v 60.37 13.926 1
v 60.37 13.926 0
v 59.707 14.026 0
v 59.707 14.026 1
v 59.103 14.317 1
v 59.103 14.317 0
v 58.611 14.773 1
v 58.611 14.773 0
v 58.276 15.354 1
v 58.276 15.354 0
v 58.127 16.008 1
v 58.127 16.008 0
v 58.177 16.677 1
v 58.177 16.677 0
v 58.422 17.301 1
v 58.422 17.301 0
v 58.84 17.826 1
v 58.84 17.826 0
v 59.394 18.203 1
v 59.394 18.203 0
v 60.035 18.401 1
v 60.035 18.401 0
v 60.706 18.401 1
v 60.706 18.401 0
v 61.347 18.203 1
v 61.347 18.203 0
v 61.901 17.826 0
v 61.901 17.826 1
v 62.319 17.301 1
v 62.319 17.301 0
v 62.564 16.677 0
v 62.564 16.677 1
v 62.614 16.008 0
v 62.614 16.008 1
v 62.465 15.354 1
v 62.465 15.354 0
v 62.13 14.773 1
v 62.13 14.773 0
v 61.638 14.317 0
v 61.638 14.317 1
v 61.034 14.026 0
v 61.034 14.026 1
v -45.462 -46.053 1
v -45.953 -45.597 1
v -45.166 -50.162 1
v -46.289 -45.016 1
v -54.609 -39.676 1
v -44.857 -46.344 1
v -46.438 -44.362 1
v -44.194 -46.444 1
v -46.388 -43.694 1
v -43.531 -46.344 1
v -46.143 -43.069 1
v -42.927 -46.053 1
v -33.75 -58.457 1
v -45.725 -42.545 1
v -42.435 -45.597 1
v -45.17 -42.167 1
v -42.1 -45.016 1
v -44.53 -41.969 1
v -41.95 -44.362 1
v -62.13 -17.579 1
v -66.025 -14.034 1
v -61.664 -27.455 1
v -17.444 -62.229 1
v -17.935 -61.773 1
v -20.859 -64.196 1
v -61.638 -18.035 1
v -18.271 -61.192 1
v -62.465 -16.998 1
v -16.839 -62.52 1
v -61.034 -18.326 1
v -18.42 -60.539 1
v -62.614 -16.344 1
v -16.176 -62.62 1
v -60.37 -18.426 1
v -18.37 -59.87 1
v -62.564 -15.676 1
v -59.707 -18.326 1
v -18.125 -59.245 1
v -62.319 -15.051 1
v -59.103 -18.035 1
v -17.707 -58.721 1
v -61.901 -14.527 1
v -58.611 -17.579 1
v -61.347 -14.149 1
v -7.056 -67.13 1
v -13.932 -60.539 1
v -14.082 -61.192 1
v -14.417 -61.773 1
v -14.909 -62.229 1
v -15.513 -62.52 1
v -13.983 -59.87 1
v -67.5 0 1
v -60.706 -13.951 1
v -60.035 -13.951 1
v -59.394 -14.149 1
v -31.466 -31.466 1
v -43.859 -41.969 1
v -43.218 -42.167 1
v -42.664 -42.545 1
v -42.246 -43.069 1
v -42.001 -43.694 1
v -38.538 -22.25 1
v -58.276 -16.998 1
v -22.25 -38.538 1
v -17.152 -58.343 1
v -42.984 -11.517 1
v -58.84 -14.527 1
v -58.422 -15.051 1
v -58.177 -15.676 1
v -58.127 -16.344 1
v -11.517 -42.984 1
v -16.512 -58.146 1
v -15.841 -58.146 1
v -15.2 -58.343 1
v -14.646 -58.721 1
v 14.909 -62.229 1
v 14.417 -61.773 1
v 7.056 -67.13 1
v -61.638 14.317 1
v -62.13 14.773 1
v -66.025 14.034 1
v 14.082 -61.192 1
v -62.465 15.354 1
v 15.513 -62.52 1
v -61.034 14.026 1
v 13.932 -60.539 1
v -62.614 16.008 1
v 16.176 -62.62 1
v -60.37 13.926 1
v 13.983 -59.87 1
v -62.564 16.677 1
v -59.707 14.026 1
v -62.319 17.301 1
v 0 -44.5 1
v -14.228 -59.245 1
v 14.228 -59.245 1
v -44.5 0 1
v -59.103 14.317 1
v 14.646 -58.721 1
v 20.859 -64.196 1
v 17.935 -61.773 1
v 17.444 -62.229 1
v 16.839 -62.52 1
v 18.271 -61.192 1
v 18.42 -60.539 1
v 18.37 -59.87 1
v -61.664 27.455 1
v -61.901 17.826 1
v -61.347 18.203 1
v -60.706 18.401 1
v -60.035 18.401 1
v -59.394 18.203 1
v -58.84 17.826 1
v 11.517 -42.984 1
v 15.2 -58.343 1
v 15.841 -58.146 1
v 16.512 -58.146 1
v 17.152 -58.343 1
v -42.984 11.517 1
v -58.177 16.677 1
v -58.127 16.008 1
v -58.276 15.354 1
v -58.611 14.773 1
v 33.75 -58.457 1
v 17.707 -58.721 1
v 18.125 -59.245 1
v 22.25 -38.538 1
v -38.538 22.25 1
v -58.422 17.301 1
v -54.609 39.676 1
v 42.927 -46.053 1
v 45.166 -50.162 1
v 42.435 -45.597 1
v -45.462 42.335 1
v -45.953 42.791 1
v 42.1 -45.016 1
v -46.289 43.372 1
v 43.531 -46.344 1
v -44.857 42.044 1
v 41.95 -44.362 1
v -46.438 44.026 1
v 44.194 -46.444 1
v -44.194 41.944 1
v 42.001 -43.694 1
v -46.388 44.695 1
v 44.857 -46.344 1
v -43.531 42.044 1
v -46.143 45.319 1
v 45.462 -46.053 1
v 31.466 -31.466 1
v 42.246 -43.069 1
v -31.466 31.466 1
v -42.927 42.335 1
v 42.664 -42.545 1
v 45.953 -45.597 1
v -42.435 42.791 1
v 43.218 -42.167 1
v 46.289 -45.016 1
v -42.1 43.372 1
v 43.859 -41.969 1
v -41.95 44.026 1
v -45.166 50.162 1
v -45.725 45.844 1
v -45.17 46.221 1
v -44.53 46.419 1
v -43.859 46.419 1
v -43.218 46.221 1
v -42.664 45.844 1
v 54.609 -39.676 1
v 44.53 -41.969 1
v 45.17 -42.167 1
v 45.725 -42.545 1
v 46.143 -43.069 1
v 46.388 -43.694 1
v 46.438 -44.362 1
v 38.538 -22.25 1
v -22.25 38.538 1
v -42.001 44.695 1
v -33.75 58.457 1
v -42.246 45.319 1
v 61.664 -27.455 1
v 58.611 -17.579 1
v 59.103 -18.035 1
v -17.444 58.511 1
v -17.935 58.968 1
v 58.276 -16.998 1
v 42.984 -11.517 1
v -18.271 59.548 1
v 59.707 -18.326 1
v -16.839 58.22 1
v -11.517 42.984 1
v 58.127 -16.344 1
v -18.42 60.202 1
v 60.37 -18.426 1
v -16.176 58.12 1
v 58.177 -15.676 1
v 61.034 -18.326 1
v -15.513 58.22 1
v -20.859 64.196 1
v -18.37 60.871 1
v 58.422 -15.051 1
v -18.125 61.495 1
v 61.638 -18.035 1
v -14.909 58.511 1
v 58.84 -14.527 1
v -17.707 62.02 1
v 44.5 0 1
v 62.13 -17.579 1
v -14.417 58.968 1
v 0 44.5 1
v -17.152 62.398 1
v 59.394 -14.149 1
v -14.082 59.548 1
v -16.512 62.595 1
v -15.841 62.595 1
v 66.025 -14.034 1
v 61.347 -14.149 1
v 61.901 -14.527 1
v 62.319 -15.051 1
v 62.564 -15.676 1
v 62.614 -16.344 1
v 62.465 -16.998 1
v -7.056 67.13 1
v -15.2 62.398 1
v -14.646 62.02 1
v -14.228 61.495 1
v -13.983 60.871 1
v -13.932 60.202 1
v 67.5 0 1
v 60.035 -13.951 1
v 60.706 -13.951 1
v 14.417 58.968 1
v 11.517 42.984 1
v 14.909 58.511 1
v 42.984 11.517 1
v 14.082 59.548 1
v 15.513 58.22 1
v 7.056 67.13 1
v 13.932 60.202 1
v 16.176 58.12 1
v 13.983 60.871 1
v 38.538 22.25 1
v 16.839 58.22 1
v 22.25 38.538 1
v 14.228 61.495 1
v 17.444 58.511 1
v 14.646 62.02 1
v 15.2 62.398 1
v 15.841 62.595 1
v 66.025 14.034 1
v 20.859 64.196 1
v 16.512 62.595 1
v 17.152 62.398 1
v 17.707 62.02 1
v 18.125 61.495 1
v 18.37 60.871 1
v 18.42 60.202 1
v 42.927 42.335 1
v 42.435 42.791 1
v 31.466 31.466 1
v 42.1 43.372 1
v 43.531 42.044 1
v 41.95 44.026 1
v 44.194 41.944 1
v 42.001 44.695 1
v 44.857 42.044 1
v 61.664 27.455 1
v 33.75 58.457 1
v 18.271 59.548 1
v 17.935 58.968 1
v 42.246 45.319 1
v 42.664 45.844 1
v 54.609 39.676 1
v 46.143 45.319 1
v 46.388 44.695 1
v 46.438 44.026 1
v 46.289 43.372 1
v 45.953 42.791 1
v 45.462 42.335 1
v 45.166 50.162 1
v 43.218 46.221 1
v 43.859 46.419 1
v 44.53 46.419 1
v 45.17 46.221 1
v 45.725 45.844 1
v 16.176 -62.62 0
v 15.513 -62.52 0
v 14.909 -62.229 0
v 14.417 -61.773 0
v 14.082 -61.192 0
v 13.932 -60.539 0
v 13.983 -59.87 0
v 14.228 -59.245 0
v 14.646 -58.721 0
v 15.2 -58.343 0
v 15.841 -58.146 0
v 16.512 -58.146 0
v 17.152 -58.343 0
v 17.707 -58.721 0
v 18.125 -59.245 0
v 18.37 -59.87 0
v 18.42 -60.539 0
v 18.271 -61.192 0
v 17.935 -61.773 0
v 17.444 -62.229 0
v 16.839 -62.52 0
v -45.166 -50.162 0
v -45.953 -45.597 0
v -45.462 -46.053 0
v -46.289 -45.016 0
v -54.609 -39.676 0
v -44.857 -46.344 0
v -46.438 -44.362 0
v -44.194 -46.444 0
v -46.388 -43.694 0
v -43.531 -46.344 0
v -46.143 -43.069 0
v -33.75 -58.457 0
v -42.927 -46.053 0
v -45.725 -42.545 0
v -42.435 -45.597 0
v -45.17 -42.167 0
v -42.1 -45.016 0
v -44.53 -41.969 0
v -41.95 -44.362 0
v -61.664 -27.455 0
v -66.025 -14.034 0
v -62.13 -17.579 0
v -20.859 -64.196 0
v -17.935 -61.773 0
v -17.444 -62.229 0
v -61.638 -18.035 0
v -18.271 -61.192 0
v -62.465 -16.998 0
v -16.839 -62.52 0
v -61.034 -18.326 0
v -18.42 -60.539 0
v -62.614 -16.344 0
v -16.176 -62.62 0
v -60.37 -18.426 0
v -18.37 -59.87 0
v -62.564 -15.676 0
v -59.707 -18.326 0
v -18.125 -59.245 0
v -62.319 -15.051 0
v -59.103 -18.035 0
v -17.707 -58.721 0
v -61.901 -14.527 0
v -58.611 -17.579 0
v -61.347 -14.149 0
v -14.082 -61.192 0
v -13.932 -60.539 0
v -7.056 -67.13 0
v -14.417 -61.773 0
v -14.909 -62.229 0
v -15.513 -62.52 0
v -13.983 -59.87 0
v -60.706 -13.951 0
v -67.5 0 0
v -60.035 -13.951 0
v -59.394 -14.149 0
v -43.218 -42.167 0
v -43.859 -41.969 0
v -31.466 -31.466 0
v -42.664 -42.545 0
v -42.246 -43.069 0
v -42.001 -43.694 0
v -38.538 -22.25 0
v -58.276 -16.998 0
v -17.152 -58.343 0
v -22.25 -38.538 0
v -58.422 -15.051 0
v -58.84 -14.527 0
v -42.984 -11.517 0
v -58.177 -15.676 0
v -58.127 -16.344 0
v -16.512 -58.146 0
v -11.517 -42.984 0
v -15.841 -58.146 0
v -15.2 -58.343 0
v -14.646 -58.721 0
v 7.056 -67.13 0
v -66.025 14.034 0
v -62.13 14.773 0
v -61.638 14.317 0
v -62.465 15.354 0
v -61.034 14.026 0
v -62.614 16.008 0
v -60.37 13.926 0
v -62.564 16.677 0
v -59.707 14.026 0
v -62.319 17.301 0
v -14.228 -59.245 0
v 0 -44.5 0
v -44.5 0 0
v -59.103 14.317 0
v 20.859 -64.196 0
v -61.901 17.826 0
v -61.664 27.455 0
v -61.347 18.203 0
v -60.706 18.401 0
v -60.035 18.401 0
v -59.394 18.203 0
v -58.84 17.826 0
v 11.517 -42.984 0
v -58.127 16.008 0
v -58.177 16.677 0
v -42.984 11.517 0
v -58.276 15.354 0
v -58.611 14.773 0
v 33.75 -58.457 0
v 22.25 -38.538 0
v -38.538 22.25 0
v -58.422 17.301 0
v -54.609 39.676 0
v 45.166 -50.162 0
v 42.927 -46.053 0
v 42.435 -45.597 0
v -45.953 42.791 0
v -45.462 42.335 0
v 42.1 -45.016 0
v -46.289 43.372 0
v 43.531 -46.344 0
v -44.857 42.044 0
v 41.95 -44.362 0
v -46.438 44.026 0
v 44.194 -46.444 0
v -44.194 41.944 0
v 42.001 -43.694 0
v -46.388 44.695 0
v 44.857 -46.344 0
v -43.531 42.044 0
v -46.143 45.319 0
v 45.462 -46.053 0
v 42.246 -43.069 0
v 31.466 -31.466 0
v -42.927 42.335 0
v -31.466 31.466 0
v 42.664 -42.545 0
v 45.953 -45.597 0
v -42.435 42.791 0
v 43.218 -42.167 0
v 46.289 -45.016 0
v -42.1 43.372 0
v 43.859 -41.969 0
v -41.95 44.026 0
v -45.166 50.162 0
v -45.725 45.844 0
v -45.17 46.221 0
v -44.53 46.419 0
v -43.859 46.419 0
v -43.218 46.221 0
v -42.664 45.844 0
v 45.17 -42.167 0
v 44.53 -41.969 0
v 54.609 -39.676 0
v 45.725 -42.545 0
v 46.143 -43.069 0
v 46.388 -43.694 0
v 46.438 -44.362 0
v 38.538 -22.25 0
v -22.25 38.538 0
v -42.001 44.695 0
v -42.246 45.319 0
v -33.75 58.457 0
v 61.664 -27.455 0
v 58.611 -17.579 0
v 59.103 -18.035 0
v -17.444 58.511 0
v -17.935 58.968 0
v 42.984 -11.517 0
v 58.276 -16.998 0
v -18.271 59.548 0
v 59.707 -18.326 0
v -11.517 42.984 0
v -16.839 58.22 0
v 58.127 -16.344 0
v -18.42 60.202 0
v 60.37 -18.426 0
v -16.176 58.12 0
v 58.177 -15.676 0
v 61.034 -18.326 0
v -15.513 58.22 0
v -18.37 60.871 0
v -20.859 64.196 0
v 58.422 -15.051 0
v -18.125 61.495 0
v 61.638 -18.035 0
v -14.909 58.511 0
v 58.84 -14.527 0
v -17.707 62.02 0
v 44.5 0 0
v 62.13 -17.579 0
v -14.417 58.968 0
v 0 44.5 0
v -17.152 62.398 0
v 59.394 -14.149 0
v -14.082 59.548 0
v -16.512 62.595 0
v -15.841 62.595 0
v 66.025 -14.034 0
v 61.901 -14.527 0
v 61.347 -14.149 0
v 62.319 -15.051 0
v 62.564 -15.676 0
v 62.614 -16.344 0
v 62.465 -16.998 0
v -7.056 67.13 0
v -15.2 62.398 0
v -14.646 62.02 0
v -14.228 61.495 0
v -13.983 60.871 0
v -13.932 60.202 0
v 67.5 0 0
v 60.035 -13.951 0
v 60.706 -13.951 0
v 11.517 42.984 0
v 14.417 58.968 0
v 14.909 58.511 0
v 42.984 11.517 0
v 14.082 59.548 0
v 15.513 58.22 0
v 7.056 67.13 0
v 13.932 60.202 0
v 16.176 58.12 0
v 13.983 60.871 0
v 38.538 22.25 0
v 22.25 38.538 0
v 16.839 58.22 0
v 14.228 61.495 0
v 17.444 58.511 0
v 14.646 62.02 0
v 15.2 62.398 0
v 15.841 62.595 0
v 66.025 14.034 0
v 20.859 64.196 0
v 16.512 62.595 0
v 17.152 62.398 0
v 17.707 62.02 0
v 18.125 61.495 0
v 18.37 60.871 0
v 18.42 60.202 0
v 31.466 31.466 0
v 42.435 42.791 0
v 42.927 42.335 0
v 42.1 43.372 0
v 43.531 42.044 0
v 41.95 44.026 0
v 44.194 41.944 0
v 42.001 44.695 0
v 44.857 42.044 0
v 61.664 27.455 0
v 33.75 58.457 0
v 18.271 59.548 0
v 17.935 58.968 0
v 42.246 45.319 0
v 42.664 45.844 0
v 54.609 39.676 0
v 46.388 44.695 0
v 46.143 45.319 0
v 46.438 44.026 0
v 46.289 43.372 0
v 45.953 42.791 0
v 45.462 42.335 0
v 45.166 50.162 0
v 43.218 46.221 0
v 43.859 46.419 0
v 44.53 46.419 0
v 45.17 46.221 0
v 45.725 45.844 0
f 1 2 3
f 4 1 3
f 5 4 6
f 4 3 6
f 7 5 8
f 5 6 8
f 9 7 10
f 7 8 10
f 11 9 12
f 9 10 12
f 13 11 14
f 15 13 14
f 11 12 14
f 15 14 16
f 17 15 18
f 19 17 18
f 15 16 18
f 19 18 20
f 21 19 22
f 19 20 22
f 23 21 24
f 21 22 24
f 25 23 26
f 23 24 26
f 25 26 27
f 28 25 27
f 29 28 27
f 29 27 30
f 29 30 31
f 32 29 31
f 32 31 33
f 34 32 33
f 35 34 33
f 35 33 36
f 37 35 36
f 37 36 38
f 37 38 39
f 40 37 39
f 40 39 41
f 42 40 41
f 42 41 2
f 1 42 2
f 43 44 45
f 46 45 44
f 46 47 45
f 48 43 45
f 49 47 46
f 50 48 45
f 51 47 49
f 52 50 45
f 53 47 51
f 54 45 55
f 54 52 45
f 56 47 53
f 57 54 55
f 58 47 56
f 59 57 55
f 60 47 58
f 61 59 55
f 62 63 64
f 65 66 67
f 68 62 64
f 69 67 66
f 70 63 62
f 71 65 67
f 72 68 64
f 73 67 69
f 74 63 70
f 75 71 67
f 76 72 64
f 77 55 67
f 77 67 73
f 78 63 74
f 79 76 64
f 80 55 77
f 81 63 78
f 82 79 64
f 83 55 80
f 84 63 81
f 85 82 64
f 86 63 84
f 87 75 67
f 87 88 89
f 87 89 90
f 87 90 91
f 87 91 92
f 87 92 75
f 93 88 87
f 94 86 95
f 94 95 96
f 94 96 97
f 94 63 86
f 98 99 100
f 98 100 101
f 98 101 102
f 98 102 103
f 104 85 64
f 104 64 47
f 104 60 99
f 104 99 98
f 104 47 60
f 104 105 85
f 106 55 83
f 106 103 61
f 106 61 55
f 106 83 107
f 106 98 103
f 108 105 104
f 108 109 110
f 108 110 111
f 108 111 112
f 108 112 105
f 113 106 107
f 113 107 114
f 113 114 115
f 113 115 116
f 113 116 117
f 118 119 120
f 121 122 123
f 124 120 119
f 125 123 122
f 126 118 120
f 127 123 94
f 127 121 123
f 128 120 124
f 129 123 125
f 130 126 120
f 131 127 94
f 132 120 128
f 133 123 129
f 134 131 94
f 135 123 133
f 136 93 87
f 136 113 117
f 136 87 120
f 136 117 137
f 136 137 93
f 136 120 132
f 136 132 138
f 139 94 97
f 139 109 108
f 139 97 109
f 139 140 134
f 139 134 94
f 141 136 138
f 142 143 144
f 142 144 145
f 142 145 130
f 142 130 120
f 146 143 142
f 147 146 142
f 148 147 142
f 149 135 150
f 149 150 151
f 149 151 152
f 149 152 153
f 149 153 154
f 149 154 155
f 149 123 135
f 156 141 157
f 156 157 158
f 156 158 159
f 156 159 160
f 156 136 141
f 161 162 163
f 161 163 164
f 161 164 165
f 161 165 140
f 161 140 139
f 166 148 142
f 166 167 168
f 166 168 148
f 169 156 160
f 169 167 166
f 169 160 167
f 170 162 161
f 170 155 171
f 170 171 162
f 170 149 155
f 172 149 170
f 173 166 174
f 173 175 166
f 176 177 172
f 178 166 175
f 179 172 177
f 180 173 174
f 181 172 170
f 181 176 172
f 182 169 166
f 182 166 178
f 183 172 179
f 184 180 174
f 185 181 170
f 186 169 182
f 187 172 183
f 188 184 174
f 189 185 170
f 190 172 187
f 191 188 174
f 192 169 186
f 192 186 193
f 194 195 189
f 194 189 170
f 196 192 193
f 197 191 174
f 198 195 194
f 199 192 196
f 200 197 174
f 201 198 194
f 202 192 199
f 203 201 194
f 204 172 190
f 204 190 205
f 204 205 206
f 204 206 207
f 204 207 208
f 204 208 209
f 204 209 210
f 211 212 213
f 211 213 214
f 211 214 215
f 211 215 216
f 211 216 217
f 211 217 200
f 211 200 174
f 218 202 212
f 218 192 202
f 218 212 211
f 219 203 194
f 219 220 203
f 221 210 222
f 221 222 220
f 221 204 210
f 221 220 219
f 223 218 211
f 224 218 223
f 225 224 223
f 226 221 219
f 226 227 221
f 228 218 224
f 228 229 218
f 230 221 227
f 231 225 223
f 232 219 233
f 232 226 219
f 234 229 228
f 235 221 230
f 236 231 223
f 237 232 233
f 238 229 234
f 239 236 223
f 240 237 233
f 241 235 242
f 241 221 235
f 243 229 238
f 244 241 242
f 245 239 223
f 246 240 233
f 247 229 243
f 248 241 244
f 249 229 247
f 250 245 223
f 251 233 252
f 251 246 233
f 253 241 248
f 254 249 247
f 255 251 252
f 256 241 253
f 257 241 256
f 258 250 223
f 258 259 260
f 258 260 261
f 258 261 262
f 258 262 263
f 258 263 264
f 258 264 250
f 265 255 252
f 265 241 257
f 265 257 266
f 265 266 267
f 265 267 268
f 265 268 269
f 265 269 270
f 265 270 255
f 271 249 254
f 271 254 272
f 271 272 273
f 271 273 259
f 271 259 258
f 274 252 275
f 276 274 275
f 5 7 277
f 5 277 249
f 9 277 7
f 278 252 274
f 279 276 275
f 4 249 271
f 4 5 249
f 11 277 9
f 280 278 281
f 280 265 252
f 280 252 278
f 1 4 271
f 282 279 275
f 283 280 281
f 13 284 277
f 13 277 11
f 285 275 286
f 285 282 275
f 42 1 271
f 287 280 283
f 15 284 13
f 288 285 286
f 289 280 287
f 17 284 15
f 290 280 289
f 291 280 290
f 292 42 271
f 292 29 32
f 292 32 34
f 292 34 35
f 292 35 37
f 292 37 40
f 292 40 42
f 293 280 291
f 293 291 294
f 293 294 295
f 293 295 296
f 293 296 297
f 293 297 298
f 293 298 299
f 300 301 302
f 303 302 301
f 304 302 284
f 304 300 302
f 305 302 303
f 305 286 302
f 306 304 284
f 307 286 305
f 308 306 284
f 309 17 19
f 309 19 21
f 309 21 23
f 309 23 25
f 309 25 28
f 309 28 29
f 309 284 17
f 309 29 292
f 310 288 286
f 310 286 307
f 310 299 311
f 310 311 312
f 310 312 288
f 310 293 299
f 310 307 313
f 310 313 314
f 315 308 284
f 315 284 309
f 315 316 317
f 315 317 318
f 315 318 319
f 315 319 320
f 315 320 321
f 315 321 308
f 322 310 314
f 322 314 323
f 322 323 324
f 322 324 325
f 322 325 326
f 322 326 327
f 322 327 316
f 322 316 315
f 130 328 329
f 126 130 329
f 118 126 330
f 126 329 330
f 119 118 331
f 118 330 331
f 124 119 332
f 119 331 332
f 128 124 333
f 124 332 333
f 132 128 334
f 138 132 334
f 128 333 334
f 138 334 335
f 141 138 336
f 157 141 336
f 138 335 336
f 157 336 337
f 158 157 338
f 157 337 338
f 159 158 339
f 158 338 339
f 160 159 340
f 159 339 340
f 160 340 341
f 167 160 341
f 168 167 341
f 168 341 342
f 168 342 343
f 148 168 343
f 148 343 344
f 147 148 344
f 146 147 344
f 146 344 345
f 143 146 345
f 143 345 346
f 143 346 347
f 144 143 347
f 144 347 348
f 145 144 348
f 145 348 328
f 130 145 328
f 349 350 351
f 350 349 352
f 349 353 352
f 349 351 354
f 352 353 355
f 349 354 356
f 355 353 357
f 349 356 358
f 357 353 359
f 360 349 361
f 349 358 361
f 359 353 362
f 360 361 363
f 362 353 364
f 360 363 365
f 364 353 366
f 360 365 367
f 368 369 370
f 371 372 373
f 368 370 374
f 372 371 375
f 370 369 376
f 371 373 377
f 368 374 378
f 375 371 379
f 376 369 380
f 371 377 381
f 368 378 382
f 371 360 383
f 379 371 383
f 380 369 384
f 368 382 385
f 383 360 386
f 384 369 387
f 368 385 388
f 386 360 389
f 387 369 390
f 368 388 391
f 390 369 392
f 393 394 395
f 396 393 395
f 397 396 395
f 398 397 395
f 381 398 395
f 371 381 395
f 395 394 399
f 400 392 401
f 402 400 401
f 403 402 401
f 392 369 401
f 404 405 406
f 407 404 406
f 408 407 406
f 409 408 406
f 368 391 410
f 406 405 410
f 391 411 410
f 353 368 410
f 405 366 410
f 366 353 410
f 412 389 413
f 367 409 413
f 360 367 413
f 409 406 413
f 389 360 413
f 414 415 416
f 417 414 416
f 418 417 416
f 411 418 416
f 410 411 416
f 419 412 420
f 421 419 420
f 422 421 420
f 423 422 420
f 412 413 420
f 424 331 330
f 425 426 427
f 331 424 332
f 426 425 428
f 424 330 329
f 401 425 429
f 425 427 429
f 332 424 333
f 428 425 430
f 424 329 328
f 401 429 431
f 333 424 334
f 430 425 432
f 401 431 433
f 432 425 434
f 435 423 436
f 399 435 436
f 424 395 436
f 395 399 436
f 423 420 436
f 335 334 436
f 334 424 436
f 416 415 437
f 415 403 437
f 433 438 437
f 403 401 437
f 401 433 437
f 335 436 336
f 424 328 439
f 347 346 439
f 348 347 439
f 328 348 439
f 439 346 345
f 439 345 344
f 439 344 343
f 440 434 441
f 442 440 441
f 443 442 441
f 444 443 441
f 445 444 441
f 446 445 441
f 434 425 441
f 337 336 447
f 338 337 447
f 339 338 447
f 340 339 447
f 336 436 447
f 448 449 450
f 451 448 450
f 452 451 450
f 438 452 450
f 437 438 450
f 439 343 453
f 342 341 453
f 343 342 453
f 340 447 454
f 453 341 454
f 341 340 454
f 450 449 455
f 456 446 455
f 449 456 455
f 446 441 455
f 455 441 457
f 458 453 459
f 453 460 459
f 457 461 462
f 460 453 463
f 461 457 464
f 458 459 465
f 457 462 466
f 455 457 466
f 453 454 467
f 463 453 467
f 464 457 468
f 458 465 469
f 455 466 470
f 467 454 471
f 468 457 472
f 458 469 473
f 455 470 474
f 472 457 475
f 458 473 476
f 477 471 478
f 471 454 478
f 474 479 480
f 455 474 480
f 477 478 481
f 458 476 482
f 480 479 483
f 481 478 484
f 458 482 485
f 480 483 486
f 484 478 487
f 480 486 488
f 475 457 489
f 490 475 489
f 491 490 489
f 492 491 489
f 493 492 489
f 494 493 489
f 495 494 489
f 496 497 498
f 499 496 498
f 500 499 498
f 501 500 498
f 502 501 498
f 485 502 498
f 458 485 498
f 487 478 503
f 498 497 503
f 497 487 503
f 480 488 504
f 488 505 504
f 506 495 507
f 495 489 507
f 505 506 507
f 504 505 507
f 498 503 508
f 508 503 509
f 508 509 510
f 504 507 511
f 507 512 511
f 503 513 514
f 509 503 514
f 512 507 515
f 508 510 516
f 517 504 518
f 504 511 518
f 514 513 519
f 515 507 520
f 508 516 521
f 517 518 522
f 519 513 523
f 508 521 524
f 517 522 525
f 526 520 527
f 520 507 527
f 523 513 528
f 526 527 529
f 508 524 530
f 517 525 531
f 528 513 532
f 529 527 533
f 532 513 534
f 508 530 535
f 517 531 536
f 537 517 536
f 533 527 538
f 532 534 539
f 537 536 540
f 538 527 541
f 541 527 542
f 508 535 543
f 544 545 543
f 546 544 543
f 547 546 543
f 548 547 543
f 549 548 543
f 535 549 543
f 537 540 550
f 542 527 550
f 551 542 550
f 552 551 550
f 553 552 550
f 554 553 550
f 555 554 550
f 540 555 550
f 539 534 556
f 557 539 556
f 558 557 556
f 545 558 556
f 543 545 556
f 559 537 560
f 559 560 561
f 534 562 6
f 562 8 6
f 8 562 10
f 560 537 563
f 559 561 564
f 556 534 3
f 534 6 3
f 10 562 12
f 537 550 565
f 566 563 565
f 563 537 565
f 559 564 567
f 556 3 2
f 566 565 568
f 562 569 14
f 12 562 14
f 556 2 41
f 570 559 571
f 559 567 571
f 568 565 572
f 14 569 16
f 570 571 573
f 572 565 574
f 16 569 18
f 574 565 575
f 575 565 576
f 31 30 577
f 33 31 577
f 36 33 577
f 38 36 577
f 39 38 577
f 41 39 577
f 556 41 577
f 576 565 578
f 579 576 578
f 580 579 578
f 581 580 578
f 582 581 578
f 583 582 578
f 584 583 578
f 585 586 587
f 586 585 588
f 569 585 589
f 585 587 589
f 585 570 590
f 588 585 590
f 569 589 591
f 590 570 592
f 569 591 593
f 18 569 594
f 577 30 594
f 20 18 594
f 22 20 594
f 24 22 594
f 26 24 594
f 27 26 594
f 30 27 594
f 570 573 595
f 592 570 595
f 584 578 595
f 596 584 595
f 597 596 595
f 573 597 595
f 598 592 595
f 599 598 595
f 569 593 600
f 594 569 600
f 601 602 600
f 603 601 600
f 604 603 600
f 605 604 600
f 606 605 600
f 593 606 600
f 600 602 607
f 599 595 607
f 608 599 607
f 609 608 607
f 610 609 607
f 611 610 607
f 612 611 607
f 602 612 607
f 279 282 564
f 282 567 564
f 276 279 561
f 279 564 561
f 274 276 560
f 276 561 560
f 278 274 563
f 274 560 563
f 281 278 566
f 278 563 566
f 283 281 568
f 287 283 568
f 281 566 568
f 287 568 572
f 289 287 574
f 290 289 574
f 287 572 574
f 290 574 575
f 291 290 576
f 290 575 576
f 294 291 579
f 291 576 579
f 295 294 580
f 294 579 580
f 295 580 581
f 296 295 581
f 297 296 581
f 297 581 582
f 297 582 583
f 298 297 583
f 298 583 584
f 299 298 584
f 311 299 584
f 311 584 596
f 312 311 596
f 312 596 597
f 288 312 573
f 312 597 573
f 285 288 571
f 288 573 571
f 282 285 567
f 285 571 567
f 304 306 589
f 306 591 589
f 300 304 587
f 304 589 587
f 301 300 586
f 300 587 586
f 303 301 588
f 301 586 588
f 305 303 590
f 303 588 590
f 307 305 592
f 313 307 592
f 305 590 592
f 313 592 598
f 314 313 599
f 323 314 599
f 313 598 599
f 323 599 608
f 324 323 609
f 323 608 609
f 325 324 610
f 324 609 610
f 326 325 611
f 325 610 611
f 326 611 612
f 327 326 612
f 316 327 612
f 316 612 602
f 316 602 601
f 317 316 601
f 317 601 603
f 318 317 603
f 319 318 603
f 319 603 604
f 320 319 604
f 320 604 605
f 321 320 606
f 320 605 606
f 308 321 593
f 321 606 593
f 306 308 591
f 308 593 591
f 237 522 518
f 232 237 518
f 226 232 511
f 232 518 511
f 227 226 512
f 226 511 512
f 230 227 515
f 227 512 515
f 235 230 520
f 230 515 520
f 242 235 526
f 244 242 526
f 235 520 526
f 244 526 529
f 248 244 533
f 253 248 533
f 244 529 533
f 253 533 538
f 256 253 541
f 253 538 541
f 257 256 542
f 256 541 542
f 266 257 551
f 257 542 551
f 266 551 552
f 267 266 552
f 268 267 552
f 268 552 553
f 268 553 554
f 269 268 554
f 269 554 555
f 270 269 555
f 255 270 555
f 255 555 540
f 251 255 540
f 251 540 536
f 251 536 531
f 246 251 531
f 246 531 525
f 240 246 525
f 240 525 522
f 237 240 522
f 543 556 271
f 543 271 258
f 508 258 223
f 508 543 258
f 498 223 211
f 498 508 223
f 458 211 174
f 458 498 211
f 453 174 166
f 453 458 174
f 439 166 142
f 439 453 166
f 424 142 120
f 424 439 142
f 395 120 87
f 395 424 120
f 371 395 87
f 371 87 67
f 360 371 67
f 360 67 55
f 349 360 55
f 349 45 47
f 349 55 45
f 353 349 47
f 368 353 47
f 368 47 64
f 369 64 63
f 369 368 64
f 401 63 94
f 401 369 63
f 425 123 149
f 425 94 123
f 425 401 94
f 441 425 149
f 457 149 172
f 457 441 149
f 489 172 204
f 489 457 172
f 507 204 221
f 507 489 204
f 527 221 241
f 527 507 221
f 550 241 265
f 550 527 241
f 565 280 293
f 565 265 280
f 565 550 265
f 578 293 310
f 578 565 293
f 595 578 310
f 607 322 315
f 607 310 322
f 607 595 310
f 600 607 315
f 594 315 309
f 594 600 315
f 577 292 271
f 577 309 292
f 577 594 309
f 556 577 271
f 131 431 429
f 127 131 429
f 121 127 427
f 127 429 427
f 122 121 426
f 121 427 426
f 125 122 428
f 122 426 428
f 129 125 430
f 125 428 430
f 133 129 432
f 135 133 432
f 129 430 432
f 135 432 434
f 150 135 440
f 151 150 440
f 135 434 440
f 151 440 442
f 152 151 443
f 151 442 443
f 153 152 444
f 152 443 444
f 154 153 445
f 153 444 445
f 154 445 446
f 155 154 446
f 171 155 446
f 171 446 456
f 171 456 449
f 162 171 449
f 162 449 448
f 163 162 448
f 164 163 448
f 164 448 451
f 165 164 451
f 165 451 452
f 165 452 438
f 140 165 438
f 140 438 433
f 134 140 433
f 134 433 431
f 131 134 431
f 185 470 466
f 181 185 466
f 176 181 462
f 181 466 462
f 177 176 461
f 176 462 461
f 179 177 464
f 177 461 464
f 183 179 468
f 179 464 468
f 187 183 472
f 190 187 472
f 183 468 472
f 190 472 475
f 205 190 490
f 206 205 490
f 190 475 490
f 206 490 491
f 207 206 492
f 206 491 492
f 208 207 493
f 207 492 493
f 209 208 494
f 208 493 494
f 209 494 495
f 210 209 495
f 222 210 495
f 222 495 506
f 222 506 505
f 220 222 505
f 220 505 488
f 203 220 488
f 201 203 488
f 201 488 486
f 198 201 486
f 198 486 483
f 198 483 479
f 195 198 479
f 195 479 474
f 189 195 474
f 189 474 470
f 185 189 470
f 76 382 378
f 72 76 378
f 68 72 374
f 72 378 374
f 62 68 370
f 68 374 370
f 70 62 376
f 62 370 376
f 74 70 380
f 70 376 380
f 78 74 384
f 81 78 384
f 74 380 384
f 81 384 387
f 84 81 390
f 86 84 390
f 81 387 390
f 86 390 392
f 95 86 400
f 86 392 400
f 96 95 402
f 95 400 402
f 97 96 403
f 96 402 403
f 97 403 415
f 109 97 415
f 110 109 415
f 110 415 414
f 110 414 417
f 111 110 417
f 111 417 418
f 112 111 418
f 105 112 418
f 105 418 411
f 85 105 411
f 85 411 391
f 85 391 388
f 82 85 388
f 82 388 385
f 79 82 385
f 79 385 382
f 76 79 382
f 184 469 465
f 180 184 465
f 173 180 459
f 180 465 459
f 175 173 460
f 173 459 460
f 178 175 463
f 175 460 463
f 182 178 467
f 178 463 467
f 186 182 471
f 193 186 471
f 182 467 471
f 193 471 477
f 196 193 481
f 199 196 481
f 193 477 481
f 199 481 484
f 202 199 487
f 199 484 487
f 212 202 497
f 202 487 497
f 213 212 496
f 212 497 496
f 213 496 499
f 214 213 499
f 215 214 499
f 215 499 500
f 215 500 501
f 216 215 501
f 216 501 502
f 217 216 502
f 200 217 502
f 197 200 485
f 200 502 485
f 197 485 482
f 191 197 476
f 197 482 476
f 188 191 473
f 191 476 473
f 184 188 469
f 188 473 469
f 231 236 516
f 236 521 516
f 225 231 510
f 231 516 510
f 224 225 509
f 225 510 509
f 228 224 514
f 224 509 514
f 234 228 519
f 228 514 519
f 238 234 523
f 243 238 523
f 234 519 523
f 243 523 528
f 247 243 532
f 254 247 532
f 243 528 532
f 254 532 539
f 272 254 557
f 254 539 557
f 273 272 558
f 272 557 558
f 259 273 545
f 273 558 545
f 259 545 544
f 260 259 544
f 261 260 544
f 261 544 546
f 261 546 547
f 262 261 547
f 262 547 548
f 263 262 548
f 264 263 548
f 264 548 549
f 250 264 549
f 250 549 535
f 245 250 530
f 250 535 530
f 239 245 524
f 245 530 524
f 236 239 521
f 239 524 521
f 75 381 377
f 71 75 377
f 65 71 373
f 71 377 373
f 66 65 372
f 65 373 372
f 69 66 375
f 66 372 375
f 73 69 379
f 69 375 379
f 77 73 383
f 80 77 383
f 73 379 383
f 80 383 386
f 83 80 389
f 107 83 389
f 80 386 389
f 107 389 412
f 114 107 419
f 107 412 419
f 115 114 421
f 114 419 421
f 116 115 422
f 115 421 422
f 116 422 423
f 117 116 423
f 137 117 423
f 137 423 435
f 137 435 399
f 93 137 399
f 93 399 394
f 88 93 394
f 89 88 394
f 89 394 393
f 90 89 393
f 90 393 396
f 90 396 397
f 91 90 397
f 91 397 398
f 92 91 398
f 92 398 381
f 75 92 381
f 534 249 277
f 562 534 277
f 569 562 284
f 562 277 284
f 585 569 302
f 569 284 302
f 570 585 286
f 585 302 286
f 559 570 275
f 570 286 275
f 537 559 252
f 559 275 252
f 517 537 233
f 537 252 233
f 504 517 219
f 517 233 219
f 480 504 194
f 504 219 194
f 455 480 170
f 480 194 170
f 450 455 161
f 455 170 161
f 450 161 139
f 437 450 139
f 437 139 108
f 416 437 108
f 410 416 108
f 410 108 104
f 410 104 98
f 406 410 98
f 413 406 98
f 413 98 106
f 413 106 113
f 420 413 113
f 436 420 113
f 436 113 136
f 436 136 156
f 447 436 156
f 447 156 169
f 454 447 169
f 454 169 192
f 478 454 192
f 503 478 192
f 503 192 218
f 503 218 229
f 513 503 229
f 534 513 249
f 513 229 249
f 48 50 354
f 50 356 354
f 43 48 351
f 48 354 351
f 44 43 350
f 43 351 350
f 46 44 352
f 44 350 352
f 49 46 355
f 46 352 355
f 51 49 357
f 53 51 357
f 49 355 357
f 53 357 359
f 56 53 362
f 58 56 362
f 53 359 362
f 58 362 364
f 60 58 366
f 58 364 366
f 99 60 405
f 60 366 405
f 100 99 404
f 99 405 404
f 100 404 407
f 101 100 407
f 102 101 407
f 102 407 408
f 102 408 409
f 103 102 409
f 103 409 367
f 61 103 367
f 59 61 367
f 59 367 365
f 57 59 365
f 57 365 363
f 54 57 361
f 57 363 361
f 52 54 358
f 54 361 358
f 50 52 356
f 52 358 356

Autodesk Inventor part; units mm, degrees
ref_plane "YZ Plane" through (0, 0, 0) normal (1, 0, 0) x (0, 1, 0)
ref_plane "XZ Plane" through (0, 0, 0) normal (0, 1, 0) x (-1, 0, 0)
ref_plane "XY Plane" through (0, 0, 0) normal (0, 0, 1) x (1, 0, 0)
sketch "スケッチ4" plane through (0, 0, 1) normal (0, 0, 1) x (1, 0, 0)
  circle A0 centre (16.1762, 60.3704) radius 2.25 projected
  circle A1 centre (-16.1762, 60.3704) radius 2.25 projected
  circle A2 centre (0, 0) radius 67.5 projected
  circle A3 centre (-16.1762, 60.3704) radius 5
  circle A4 centre (16.1762, 60.3704) radius 5
  circle A5 centre (0, 0) radius 62.5
  point P0 (-11.2987, 61.4702)
  point P1 (11.2987, 61.4702)
  point P2 (17.4703, 65.2)
  point P3 (-17.4703, 65.2)
sketch "スケッチ1" plane through (0, 0, 0) normal (0, 0, 1) x (1, 0, 0)
  circle A0 centre (0, 0) radius 67.5
  dimension "d0" = 135
extrude "プレート1" add sketch "スケッチ1" along normal blind 1
sketch "スケッチ2" plane through (0, 0, 1) normal (0, 0, 1) x (1, 0, 0)
  circle A0 centre (0, 0) radius 44.5
  dimension "d2" = 89
extrude "押し出し1" cut sketch "スケッチ2" against normal through all
sketch "スケッチ3" plane through (0, 0, 1) normal (0, 0, 1) x (1, 0, 0)
  circle A0 centre (0, 0) radius 62.5
  point P0 (16.1762, 60.3704)
  point P1 (-16.1762, 60.3704)
  point P2 (-44.1942, 44.1942)
  point P3 (-60.3704, 16.1762)
  point P4 (-60.3704, -16.1762)
  point P5 (-44.1942, -44.1942)
  point P6 (-16.1762, -60.3704)
  point P7 (16.1762, -60.3704)
  point P8 (44.1942, -44.1942)
  point P9 (60.3704, -16.1762)
  point P10 (60.3704, 16.1762)
  point P11 (44.1942, 44.1942)
  dimension "d5" = 125
  dimension "d8" = 360
  dimension "d23" = 0
hole "穴1" at (16.1762, 60.3704, 1) at (-16.1762, 60.3704, 1) at (-44.1942, 44.1942, 1) at (-60.3704, 16.1762, 1) at (-60.3704, -16.1762, 1) at (-44.1942, -44.1942, 1) at (-16.1762, -60.3704, 1) at (16.1762, -60.3704, 1) at (44.1942, -44.1942, 1) at (60.3704, -16.1762, 1) at (60.3704, 16.1762, 1) at (44.1942, 44.1942, 1) direction (0, 0, -1) diameter 4.5 end through all clearance for "Flat Head Machine Screw" size "M4" standard "Ansi Metric M Profile"
equation "\"d15\" = Thickness"
equation "\"d1\" = Thickness"
equation "\"BendRadius\" = Thickness"
equation "\"BendReliefWidth\" = Thickness"
equation "\"BendReliefDepth\" = 0.5 * Thickness"
equation "\"CornerReliefSize\" = 4 * Thickness"
equation "\"MinimumRemnant\" = 2 * Thickness"
equation "\"TransitionRadius\" = BendRadius"
equation "\"JacobiRadiusSize\" = BendRadius"
equation "\"GapSize\" = Thickness"
equation "\"Thickness\" = 1"
properties part number "unit-plate3" material "CFRP"
